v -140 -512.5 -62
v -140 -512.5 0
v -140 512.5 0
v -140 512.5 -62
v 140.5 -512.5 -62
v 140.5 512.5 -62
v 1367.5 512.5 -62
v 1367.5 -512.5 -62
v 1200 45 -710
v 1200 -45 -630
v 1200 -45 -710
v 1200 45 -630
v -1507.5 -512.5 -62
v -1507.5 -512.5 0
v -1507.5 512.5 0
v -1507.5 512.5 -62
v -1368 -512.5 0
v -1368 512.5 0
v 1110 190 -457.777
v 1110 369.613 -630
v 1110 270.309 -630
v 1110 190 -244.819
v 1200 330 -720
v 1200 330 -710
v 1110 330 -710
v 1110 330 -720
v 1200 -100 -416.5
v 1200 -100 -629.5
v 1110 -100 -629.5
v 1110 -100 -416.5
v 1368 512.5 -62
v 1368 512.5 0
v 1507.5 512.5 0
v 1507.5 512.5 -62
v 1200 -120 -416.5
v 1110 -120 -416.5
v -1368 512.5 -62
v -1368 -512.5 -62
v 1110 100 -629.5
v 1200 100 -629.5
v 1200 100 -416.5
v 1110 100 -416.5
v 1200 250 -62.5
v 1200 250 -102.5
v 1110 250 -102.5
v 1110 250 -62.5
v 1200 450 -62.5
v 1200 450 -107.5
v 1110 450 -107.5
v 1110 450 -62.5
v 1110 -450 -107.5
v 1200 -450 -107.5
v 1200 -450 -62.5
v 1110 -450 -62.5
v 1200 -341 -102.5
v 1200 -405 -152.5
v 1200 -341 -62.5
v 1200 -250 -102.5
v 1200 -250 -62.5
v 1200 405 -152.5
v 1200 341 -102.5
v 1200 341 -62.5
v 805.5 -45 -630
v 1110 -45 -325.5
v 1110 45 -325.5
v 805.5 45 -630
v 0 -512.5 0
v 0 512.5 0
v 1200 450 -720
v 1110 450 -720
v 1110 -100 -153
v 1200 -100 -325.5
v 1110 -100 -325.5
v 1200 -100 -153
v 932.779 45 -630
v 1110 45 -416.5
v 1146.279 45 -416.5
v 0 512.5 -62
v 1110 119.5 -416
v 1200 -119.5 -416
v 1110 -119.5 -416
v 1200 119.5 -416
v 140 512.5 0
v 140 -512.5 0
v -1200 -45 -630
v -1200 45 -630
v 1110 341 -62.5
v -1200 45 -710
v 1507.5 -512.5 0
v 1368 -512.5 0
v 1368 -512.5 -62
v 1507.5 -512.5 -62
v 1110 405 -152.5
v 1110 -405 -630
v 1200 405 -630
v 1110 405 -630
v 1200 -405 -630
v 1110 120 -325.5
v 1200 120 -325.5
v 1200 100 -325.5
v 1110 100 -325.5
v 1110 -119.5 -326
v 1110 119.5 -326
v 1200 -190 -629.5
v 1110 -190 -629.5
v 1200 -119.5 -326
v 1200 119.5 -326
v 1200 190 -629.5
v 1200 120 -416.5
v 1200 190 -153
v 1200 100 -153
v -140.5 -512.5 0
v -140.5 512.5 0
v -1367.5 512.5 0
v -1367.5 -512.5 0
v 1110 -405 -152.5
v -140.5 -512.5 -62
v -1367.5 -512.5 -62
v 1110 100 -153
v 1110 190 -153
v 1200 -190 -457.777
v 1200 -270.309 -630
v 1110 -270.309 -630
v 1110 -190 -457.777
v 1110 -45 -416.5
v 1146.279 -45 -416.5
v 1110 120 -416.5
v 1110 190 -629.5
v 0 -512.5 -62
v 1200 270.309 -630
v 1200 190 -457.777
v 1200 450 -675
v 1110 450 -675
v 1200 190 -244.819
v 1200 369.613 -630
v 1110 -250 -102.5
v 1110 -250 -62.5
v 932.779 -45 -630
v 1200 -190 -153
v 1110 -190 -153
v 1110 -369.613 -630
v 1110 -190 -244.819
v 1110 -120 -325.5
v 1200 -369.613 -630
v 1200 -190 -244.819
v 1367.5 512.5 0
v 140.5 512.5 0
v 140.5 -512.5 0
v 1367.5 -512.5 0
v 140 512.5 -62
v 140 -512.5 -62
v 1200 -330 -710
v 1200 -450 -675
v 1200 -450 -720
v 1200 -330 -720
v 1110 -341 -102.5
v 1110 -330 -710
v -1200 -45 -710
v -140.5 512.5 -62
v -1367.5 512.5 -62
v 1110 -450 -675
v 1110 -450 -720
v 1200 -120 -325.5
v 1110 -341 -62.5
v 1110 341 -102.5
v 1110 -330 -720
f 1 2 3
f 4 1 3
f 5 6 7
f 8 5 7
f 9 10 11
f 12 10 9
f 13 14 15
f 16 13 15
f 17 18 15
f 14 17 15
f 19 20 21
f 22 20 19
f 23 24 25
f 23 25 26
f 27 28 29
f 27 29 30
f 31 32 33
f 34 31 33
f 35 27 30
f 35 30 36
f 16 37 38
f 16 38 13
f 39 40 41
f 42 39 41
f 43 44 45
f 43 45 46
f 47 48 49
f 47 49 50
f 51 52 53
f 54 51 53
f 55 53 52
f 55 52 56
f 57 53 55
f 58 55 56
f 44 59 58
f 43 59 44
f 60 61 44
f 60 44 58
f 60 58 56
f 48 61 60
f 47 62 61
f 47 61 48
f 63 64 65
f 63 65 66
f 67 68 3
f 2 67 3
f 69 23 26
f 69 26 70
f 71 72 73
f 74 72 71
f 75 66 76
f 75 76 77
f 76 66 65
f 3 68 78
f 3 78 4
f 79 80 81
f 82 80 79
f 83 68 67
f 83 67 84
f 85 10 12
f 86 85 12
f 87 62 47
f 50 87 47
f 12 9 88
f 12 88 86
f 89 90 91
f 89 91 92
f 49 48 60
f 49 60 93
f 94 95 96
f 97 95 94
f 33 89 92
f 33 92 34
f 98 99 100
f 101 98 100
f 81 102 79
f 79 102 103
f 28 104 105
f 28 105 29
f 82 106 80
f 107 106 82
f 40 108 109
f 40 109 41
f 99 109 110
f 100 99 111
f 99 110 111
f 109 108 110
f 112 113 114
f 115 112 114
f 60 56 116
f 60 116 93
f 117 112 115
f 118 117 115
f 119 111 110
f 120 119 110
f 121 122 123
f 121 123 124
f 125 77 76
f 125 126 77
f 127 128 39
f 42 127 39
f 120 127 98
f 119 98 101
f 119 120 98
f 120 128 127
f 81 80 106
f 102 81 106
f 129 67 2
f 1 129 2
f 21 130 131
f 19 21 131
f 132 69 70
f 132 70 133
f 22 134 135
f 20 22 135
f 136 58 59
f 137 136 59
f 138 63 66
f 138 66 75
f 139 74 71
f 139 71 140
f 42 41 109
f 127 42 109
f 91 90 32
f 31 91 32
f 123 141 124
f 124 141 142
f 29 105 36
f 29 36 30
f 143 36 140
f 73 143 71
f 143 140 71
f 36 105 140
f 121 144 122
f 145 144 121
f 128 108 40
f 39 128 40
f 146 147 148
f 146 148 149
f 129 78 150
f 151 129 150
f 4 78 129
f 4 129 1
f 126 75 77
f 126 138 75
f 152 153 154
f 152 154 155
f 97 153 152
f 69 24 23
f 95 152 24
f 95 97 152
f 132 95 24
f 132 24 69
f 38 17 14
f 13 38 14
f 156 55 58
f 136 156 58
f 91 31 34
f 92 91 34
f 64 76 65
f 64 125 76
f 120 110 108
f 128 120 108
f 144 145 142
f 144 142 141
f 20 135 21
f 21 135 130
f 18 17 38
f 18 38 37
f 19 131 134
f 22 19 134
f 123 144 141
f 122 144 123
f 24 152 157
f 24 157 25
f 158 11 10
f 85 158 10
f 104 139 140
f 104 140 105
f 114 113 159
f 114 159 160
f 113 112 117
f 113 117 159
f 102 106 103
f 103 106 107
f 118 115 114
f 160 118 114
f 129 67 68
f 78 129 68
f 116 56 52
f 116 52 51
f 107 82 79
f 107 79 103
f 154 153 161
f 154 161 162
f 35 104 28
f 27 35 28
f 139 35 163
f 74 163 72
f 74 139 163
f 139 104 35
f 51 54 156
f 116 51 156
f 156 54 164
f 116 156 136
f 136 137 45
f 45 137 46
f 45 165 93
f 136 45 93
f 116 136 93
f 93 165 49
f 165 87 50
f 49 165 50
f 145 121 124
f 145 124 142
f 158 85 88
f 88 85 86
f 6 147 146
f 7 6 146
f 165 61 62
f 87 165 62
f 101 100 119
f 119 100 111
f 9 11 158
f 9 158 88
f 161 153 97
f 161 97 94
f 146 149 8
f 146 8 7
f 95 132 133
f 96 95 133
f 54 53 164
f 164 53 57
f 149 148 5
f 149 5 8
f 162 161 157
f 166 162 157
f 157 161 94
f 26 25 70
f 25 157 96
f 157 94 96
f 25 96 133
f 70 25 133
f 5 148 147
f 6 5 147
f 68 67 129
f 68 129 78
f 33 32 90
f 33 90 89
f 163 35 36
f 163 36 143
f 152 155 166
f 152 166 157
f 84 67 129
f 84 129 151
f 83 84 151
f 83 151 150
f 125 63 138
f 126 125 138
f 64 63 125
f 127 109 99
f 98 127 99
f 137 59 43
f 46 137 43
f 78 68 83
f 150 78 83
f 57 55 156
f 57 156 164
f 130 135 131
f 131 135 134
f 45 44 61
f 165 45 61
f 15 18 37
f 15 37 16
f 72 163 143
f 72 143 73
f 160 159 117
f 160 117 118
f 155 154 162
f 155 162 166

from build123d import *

# Parameters (mm, degrees)
F0_W      = 140
F0_H      = 1025
F4_DEPTH  = 62
F5_W      = 1227
F5_H      = 1025
F6_DEPTH  = 62
F7_W      = 139.5
F7_H      = 1025
F8_DEPTH  = 62
F12_W     = 900
F12_H     = 90
F13_DEPTH = 90
F14_SIZE2 = 45
F14_SIZE  = 45
F15_W     = 91
F15_H     = 40
F16_DEPTH = 90
F18_DEPTH = 90
F19_SIZE2 = 45
F19_SIZE  = 45
F21_DEPTH = 90
F23_W     = 239
F23_H     = 90
F24_DEPTH = 90
F26_DEPTH = 90
F28_W     = 90
F28_H     = 80
F29_DEPTH = 2400
F31_DEPTH = 45


with BuildPart() as f4:
    # F0 (on Top) → F4 (new body)
    with BuildSketch(Plane.XY):
        with Locations((70, 0)):
            Rectangle(F0_W, F0_H)
    extrude(amount=-F4_DEPTH)


with BuildPart() as f6:
    # F5 (on Top) → F6 (new body, through all)
    with BuildSketch(Plane.XY):
        with Locations((754, 0)):
            Rectangle(F5_W, F5_H)
    extrude(amount=-F6_DEPTH)


with BuildPart() as f8:
    # F7 (on Top) → F8 (new body, through all)
    with BuildSketch(Plane.XY):
        with Locations((1437.75, 0)):
            Rectangle(F7_W, F7_H)
    extrude(amount=-F8_DEPTH)


with BuildPart() as f9_1:
    # F9: instance of F4
    add(f4.part.mirror(Plane.YZ))


with BuildPart() as f10_1:
    # F10: instance of F6
    add(f6.part.mirror(Plane.YZ))


with BuildPart() as f11_1:
    # F11: instance of F8
    add(f8.part.mirror(Plane.YZ))


with BuildPart() as f13:
    # F12 (on offset) → F13 (new body)
    with BuildSketch(Plane.YZ.offset(1200)):
        with Locations((0, -107.5)):
            Rectangle(F12_W, F12_H)
    extrude(amount=-F13_DEPTH)

    # F14
    f14_edges = [f13.edges().sort_by_distance(p)[0] for p in [
        (1155, -450, -152.5),
        (1155, 450, -152.5),
    ]]
    chamfer(f14_edges, length=F14_SIZE, length2=F14_SIZE2)

    # F15 (on face) → F16 (cut, through all)
    with BuildSketch(Plane.YZ.offset(1200)):
        with Locations((-295.5, -82.5)):
            Rectangle(F15_W, F15_H)
        with Locations((295.5, -82.5)):
            Rectangle(F15_W, F15_H)
    extrude(amount=-F16_DEPTH, mode=Mode.SUBTRACT)


with BuildPart() as f18:
    # F17 (on offset) → F18 (new body)
    with BuildSketch(Plane.YZ.offset(1200)):
        Polygon((450, -630), (0, -630), (-450, -630), (-450, -720), (-330, -720), (-330, -710), (0, -710), (330, -710), (330, -720), (450, -720), align=None)
    extrude(amount=-F18_DEPTH)

    # F19
    f19_edges = [f18.edges().sort_by_distance(p)[0] for p in [
        (1155, -450, -630),
        (1155, 450, -630),
    ]]
    chamfer(f19_edges, length=F19_SIZE, length2=F19_SIZE2)


with BuildPart() as f21:
    # F20 (on offset) → F21 (new body)
    with BuildSketch(Plane.YZ.offset(1200)):
        Polygon((-100, -153), (-190, -153), (-190, -629.5), (-100, -629.5), (-100, -416.5), (-120, -416.5), (-120, -325.5), (-100, -325.5), align=None)
    extrude(amount=-F21_DEPTH)


with BuildPart() as f22_1:
    # F22: instance of F21
    add(f21.part.mirror(Plane.XZ))


with BuildPart() as f24:
    # F23 (on offset) → F24 (new body)
    with BuildSketch(Plane.YZ.offset(1200)):
        with Locations((0, -371)):
            Rectangle(F23_W, F23_H)
    extrude(amount=-F24_DEPTH)


with BuildPart() as f26:
    # F25 (on offset) → F26 (new body)
    with BuildSketch(Plane.YZ.offset(1200)):
        Polygon((-190, -457.777333), (-190, -244.819191), (-369.612761, -630), (-270.308749, -630), align=None)
    extrude(amount=-F26_DEPTH)


with BuildPart() as f27_1:
    # F27: instance of F26
    add(f26.part.mirror(Plane.XZ))


with BuildPart() as f29:
    # F28 (on offset) → F29 (new body, through all)
    with BuildSketch(Plane.YZ.offset(1200)):
        with Locations((0, -670)):
            Rectangle(F28_W, F28_H)
    extrude(amount=-F29_DEPTH)


with BuildPart() as f31:
    # F30 (on Front) → F31 (new body, symmetric)
    with BuildSketch(Plane.XZ):
        Polygon((1110, -416.5), (1110, -325.5), (805.5, -630), (932.779221, -630), (1146.279221, -416.5), align=None)
    extrude(amount=F31_DEPTH, both=True)


solid = Compound([f4.part, f6.part, f8.part, f9_1.part, f10_1.part, f11_1.part, f13.part, f18.part, f21.part, f22_1.part, f24.part, f26.part, f27_1.part, f29.part, f31.part])
